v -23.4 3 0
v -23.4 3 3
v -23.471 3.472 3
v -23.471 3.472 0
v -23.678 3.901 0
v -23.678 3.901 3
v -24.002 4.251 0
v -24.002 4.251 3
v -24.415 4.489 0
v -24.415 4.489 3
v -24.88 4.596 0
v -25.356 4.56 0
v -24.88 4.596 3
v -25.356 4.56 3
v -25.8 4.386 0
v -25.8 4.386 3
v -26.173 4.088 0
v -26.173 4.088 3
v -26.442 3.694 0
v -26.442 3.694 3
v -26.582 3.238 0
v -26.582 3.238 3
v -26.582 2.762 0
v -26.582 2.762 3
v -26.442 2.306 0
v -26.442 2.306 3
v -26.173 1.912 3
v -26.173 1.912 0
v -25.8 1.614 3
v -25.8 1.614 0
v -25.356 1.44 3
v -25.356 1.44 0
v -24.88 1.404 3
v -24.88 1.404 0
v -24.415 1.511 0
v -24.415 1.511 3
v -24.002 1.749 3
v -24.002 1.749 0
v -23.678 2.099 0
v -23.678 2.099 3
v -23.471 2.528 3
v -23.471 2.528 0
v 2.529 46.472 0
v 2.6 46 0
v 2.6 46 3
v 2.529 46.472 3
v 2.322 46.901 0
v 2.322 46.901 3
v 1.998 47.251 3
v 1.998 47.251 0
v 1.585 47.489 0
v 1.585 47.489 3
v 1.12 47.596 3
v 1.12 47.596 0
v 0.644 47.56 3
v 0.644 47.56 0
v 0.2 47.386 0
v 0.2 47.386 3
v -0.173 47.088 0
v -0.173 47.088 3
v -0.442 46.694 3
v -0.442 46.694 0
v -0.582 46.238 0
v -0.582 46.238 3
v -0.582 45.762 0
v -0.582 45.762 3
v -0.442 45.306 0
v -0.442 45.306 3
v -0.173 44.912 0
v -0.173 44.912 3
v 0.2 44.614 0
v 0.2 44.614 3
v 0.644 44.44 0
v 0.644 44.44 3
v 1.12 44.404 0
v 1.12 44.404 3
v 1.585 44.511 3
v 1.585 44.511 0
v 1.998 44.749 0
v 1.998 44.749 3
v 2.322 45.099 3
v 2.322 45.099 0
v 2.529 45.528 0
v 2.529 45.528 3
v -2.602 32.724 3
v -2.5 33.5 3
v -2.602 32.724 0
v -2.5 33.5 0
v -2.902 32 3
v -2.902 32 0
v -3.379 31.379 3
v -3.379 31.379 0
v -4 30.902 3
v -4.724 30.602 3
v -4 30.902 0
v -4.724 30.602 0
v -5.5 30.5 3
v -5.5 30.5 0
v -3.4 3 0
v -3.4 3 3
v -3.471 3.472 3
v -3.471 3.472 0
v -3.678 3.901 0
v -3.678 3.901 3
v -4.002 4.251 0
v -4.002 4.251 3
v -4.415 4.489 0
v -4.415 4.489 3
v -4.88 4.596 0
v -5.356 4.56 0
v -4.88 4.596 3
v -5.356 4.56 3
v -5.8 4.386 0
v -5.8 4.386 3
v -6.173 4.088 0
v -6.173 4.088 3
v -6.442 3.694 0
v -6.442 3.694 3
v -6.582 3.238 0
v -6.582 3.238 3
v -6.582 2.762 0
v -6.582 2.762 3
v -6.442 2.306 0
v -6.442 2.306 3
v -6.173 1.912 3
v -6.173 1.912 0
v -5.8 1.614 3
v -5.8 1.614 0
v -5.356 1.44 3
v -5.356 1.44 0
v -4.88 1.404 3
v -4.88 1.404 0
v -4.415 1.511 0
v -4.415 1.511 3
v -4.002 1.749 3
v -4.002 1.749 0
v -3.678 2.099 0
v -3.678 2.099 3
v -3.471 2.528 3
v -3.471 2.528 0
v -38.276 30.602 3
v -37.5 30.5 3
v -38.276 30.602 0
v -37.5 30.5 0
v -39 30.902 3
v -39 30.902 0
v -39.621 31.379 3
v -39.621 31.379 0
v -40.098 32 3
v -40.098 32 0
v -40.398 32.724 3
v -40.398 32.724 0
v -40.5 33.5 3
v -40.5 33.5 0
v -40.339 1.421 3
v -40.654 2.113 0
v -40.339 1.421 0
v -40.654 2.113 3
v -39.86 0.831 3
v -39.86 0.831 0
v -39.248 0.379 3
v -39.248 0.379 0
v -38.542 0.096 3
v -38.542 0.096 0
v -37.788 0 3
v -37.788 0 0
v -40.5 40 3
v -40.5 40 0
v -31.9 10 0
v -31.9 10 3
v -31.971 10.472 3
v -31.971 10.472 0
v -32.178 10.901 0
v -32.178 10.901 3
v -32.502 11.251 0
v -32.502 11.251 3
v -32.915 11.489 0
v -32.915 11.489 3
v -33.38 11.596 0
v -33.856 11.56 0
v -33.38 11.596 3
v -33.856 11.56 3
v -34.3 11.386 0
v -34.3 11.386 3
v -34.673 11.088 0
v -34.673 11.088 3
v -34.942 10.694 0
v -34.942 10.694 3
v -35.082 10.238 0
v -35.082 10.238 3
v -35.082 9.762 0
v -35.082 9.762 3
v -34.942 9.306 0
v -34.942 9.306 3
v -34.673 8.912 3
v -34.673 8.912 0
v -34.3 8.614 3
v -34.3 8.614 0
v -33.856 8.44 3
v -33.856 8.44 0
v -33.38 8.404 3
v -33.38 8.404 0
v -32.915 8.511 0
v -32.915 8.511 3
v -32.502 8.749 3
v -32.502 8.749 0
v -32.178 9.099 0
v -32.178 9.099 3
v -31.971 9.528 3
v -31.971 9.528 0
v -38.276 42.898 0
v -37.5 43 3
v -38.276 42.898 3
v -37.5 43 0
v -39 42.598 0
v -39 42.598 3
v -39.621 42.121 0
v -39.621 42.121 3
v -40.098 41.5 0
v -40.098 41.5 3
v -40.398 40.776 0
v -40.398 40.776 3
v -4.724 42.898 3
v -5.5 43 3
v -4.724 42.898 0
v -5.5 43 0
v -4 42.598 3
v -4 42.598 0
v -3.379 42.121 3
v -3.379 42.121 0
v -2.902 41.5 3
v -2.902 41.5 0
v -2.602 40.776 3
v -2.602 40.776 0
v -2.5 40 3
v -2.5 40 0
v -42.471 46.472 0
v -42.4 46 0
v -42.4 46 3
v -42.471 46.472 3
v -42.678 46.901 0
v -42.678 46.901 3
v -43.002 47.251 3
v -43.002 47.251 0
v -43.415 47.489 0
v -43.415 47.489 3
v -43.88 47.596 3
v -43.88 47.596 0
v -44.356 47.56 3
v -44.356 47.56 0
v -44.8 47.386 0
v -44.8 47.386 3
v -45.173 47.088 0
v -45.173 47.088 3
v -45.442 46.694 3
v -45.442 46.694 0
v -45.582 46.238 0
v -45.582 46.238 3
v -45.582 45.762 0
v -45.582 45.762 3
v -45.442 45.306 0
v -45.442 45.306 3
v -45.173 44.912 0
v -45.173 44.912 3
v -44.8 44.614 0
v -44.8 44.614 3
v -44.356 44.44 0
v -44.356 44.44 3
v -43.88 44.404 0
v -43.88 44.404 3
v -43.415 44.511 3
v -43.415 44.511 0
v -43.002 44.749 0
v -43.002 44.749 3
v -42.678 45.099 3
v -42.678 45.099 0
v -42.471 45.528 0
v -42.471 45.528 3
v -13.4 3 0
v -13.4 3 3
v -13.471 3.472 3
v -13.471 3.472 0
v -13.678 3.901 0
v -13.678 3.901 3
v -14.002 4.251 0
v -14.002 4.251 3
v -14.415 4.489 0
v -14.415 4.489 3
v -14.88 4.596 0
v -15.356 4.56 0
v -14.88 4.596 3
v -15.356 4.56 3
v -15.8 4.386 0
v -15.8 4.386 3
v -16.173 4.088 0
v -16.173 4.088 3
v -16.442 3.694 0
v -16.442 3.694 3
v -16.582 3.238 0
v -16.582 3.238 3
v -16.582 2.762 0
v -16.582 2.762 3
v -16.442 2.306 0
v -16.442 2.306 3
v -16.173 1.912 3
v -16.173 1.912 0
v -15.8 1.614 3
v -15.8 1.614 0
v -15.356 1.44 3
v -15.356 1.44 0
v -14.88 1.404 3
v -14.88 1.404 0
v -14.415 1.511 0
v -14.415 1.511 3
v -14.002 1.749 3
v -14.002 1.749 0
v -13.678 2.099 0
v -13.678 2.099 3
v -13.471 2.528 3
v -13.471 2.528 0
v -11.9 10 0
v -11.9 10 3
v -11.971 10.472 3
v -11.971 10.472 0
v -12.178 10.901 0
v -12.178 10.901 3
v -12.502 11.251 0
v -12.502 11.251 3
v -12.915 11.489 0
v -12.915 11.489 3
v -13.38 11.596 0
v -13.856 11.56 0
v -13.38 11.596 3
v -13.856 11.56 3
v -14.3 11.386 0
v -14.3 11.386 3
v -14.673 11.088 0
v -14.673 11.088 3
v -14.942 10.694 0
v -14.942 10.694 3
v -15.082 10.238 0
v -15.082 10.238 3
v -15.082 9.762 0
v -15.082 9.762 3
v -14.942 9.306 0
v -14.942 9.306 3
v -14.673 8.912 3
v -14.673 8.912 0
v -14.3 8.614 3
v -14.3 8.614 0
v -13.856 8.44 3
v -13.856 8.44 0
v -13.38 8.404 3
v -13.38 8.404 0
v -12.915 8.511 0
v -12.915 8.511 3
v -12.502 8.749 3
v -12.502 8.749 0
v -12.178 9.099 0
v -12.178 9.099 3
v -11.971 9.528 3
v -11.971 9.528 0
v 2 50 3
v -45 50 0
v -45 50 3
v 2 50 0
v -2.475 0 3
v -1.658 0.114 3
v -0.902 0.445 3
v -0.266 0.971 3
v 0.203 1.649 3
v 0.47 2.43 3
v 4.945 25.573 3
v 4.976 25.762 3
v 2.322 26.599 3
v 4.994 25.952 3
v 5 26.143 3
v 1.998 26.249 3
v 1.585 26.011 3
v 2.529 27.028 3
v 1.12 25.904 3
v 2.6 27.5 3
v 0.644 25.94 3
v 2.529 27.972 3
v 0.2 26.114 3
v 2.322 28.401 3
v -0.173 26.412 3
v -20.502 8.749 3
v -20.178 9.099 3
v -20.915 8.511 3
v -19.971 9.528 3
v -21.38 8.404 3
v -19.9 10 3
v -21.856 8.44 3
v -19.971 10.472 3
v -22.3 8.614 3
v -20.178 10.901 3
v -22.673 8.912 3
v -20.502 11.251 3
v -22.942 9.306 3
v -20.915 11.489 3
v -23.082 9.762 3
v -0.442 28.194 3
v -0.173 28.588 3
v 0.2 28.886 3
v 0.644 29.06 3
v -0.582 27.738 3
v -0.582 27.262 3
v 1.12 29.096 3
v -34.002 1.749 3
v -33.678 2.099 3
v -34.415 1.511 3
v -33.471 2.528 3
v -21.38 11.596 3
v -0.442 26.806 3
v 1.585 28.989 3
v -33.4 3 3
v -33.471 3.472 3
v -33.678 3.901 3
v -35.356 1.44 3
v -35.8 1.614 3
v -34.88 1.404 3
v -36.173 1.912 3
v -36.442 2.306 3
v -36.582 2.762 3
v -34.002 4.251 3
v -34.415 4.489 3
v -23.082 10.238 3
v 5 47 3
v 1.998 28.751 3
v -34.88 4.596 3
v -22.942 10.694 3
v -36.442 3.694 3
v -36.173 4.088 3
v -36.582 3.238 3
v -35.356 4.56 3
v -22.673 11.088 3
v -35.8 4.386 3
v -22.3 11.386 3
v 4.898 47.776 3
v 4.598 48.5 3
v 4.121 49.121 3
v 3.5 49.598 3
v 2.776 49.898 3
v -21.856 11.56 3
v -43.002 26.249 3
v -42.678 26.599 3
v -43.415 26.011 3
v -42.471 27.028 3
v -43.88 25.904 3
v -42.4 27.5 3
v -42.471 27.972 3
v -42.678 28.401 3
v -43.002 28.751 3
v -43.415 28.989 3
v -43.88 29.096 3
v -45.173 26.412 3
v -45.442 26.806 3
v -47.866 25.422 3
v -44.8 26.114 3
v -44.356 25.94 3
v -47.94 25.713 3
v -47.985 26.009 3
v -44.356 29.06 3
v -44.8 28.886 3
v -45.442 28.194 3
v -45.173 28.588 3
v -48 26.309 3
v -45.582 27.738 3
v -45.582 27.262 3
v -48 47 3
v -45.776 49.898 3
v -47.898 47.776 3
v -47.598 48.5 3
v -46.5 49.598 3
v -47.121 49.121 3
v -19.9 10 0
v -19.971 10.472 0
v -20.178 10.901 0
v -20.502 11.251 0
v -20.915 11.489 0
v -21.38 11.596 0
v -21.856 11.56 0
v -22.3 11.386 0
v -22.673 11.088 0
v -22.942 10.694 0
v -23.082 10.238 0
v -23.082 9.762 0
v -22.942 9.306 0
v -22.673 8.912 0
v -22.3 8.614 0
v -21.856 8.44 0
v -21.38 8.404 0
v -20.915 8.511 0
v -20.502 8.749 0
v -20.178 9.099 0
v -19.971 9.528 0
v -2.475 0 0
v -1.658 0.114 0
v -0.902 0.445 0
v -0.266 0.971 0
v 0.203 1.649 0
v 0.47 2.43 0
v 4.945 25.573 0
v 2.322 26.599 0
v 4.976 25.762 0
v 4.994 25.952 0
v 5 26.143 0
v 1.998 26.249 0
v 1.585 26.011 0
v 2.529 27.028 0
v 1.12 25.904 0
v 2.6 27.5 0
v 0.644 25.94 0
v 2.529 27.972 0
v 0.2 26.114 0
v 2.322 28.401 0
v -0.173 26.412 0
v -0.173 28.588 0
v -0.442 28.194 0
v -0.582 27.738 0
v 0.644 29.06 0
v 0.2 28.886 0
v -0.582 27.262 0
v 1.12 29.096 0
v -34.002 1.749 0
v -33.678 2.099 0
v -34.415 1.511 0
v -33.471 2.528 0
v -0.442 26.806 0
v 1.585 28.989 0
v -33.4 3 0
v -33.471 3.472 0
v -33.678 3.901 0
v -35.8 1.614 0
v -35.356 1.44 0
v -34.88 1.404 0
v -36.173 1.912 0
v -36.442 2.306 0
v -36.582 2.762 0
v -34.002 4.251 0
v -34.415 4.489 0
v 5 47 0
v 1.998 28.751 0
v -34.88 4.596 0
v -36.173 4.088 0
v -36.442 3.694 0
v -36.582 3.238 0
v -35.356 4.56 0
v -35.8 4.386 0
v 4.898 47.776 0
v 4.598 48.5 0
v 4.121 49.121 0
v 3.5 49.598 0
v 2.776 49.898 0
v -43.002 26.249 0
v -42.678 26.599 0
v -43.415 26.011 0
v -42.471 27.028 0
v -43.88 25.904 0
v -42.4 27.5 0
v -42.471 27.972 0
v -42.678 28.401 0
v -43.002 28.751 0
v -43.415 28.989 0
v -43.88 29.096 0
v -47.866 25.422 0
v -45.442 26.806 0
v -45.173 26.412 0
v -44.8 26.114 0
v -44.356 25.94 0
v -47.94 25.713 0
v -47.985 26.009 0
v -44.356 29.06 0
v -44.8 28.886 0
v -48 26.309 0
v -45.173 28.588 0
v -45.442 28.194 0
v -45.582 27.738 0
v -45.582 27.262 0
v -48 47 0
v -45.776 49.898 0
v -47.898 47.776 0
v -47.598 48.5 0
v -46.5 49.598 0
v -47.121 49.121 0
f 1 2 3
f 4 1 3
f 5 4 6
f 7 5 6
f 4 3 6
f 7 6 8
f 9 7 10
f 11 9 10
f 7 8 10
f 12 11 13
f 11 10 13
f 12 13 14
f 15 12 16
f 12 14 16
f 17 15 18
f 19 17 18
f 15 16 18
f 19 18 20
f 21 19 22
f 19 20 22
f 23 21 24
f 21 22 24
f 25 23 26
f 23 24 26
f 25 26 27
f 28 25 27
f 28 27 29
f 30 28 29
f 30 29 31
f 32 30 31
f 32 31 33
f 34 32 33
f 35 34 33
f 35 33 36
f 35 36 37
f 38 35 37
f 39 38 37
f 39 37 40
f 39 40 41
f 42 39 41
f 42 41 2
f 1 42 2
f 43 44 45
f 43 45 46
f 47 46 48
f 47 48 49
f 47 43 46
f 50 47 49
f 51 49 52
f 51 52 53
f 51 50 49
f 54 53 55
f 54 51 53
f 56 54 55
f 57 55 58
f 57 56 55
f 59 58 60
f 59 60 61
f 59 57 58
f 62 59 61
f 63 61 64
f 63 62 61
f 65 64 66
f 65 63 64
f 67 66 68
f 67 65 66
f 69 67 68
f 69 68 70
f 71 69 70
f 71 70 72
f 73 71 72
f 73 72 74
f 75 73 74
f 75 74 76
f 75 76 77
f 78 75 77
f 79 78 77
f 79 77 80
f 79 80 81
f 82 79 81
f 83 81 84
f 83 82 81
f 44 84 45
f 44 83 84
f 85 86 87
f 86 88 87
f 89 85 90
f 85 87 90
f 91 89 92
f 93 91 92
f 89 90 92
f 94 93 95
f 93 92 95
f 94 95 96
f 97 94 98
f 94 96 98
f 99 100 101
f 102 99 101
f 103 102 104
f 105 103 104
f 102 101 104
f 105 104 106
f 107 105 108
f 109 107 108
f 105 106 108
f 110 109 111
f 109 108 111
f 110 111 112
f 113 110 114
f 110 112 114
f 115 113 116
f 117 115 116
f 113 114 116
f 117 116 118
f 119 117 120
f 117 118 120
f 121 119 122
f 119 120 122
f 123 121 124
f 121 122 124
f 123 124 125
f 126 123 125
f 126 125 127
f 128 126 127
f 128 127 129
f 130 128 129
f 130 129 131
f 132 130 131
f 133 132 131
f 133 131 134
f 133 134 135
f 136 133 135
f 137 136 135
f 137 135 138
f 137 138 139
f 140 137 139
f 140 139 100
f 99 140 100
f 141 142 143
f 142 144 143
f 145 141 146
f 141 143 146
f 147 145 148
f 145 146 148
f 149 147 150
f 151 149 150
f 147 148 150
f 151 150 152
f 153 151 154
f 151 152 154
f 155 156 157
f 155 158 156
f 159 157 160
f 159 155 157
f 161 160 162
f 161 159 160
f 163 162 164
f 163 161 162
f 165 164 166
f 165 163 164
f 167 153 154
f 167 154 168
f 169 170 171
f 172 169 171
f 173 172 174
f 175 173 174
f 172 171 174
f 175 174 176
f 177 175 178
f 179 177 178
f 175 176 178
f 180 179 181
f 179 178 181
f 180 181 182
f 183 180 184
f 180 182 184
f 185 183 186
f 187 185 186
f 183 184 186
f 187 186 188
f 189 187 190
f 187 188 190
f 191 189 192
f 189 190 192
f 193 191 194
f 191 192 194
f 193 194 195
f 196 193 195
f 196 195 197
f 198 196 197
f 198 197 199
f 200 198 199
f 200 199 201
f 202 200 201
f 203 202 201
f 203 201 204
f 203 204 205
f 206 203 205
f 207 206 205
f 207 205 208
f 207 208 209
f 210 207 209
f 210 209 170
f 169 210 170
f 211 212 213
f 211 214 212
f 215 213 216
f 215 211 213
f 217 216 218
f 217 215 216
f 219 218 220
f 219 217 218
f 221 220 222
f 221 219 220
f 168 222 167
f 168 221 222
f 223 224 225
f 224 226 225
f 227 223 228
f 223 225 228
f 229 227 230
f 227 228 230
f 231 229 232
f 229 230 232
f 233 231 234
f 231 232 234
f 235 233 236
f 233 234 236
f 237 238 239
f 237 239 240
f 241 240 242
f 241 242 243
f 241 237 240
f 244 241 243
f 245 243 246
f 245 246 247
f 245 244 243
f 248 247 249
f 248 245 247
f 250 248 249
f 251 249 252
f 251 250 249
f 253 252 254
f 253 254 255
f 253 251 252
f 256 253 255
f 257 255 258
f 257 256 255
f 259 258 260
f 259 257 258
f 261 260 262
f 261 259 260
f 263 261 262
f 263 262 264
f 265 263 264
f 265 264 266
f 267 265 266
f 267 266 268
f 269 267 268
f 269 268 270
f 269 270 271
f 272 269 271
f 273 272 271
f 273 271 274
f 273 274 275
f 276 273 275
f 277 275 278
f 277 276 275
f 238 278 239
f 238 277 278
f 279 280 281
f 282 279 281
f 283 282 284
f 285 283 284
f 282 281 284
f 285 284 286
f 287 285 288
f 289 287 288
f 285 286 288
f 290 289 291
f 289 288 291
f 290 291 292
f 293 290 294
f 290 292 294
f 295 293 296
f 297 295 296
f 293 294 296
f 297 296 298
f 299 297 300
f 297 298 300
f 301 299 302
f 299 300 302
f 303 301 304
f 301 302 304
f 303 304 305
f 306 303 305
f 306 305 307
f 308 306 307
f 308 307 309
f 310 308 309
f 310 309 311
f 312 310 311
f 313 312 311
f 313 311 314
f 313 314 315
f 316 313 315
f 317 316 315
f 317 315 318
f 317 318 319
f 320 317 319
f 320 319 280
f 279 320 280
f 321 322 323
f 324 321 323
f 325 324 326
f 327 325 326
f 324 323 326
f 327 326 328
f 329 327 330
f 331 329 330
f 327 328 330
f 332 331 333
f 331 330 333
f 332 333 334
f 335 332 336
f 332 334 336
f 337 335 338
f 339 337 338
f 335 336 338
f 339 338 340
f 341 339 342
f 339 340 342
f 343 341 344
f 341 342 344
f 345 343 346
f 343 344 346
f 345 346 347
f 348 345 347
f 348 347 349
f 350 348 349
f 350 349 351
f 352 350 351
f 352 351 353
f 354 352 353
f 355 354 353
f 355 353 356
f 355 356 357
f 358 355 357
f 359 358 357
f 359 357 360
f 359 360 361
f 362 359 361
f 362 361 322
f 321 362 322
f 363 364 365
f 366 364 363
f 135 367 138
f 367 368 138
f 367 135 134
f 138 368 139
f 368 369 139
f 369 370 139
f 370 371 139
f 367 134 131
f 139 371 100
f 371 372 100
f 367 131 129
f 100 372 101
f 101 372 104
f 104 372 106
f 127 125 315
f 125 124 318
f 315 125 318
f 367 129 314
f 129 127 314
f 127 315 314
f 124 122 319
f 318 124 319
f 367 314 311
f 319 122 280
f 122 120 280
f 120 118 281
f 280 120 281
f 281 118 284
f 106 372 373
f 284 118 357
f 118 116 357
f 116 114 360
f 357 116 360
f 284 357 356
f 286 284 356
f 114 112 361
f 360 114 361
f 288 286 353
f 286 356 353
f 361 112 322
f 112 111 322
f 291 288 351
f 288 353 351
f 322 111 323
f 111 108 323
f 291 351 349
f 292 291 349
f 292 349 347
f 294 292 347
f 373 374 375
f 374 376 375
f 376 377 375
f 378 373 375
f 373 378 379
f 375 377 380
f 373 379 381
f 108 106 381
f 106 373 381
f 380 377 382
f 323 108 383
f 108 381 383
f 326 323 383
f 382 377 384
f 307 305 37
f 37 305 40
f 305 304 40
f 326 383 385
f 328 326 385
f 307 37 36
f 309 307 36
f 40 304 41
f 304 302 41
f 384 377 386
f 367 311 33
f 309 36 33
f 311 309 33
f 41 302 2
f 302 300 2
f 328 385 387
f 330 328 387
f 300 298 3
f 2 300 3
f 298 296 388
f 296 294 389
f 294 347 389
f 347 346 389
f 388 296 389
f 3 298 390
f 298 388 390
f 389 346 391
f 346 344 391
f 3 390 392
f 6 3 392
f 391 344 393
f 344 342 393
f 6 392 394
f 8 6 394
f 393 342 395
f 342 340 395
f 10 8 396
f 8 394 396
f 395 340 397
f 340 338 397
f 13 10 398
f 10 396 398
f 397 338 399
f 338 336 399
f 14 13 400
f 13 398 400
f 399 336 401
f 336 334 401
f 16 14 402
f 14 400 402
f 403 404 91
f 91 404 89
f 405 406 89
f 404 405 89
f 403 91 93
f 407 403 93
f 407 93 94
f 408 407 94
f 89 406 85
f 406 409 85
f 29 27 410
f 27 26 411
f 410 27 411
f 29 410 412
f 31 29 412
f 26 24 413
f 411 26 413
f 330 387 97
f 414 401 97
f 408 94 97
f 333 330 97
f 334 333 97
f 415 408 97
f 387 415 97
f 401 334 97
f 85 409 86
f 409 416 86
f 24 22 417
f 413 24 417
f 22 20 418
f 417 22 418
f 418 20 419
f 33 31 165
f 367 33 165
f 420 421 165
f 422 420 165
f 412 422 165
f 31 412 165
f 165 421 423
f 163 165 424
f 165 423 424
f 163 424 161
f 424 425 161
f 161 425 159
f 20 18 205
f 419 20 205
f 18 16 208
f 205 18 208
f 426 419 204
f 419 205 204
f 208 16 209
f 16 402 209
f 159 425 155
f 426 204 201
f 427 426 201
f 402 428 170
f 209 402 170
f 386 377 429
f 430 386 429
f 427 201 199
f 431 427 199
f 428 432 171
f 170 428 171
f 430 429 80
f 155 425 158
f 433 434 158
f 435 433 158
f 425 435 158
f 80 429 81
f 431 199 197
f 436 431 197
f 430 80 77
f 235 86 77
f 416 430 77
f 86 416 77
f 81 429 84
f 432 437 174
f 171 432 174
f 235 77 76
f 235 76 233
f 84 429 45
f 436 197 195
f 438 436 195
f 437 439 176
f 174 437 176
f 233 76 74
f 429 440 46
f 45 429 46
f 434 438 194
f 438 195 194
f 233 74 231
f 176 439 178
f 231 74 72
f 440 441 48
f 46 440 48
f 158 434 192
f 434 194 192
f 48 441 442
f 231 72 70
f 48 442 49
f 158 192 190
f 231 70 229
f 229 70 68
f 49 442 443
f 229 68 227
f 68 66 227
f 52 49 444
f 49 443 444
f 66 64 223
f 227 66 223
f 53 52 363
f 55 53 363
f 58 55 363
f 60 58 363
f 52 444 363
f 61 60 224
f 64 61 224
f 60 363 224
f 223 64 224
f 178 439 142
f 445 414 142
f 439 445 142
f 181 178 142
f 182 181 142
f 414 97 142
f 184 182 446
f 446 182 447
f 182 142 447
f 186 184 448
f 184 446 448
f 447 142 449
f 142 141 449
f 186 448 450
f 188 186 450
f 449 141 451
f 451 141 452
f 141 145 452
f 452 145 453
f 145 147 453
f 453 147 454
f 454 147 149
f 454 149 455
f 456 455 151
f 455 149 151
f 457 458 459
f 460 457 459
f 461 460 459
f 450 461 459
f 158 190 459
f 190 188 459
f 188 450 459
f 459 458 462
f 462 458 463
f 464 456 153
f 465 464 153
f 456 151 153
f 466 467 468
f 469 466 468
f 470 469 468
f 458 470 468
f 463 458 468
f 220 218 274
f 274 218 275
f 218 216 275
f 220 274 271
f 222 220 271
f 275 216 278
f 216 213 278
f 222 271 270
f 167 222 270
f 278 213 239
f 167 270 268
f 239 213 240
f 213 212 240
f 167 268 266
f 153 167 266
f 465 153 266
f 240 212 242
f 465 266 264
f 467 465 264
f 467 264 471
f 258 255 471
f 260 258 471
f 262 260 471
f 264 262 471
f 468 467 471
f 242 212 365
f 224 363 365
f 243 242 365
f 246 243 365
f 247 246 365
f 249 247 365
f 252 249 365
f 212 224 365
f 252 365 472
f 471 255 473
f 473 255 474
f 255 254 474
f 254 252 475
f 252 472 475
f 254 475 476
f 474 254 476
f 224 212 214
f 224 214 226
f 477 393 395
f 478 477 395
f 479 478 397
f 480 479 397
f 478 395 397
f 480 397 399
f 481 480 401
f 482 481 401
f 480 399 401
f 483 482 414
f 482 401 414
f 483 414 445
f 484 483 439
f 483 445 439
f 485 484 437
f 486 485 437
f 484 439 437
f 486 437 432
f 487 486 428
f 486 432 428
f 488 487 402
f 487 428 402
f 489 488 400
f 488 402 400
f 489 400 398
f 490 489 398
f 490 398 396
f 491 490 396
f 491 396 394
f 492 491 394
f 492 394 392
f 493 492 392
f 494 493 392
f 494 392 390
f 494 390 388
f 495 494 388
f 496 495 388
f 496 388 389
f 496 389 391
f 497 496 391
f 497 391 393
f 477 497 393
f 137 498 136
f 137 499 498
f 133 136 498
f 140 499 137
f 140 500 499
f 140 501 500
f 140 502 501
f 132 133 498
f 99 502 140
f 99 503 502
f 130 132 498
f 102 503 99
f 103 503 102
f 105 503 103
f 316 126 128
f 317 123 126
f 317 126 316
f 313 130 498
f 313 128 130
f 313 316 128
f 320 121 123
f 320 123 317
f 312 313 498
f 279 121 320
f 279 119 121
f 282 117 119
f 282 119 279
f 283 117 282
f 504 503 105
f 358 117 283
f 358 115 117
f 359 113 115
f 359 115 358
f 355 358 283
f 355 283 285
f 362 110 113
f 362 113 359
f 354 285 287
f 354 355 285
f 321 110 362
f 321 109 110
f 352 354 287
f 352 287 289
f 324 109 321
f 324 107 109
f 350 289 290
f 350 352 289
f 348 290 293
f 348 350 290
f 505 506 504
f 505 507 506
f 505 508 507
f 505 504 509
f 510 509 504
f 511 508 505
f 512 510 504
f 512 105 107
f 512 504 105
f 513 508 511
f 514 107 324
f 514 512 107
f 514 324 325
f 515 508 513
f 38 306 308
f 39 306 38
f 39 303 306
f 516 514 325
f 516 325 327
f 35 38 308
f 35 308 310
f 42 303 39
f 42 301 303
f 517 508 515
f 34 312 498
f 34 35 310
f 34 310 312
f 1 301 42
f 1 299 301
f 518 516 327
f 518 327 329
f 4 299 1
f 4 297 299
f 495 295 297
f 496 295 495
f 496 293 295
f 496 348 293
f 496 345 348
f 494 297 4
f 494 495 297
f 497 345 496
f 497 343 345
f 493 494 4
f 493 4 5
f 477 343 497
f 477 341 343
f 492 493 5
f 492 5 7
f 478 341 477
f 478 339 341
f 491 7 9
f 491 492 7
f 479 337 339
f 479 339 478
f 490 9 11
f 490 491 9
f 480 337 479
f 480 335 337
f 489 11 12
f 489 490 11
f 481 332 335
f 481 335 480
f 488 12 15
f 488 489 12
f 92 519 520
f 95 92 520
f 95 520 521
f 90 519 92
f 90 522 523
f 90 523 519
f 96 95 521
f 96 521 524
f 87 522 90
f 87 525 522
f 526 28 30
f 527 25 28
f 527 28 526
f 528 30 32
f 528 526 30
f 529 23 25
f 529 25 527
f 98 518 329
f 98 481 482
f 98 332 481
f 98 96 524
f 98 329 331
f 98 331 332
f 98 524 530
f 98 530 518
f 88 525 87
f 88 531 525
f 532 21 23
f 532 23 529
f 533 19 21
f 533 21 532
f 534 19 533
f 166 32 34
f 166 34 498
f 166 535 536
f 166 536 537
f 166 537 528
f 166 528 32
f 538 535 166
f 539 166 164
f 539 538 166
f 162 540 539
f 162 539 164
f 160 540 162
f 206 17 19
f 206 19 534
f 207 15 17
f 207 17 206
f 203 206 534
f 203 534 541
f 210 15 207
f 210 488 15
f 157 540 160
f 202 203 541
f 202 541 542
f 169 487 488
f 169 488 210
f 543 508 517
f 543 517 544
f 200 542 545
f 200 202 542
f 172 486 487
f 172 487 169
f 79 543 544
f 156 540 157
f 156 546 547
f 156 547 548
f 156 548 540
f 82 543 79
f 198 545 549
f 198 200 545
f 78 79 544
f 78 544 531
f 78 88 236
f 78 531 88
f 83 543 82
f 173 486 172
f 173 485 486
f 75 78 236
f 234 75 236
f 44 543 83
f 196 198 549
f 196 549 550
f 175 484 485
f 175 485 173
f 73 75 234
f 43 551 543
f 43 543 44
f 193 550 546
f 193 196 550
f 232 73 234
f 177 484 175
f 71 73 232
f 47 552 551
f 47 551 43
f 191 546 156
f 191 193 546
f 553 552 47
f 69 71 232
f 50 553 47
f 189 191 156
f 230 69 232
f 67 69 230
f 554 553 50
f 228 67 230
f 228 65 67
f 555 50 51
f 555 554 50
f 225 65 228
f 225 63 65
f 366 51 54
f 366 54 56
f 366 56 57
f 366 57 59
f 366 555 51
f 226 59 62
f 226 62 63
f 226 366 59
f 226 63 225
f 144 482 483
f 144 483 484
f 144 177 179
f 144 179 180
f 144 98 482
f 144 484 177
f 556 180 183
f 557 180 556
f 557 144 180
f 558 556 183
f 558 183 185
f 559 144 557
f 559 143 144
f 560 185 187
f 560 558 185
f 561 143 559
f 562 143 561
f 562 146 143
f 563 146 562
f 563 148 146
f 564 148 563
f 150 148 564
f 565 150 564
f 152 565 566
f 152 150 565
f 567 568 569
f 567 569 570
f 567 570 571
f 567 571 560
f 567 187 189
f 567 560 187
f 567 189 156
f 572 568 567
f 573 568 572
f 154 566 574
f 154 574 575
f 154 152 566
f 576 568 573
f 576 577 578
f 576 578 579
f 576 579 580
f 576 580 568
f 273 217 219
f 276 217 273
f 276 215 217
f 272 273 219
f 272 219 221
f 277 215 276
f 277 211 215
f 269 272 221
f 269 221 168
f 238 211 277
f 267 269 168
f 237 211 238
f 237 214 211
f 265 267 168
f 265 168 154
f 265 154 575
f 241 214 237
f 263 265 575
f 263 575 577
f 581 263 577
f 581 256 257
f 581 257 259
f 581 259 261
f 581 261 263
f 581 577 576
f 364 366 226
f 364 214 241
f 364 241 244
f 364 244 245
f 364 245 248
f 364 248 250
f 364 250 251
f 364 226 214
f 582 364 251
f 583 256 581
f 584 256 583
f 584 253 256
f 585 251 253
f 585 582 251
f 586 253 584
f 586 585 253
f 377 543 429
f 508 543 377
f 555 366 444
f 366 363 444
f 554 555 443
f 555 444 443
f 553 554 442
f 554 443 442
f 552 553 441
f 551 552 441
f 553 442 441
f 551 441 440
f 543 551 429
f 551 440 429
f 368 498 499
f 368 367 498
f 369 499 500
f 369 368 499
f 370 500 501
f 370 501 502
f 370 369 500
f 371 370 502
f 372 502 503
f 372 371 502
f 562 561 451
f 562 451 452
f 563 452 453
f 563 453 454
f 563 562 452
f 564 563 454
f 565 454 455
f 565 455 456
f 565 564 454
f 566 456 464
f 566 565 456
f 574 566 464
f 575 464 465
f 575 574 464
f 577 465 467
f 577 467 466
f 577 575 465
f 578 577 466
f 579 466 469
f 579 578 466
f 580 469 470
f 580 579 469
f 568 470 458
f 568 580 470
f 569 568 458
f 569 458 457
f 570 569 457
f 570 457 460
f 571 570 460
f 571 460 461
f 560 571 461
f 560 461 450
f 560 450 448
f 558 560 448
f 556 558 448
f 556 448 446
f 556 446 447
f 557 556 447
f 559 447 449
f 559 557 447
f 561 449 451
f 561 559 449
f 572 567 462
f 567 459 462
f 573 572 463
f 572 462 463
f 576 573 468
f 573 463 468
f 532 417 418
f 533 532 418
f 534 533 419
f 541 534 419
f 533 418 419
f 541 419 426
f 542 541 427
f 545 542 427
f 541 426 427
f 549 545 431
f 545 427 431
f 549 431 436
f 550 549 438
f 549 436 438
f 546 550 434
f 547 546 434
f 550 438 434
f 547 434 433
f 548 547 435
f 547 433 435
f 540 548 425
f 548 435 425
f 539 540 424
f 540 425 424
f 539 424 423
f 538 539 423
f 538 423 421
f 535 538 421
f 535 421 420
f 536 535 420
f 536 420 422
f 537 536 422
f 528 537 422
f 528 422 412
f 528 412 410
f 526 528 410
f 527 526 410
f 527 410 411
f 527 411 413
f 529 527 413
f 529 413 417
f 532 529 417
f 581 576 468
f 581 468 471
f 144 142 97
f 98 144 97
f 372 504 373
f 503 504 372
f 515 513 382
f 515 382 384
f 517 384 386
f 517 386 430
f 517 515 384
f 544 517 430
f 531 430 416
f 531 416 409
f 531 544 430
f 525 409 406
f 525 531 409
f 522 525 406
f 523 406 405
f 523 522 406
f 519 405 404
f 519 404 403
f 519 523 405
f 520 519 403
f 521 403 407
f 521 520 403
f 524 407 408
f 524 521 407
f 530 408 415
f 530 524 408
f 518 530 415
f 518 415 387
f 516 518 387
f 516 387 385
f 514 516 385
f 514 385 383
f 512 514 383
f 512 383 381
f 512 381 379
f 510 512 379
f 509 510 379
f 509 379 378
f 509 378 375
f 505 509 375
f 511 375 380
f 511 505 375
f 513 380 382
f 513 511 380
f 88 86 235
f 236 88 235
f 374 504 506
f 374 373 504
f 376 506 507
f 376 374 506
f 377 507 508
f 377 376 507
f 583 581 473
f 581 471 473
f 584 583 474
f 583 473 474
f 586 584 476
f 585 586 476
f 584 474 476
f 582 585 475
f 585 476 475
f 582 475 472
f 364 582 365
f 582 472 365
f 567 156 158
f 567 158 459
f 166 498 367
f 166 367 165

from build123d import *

# Parameters (mm, degrees)
SKETCH_1_R          = 1.6
EXTRUDE_1_DEPTH     = 3
SKETCH_2_R          = 1.6
CUT_EXTRUDE_1_DEPTH = 4
SKETCH_3_R          = 1.6
CUT_EXTRUDE_2_DEPTH = 4
SKETCH_4_W          = 38
SKETCH_4_H          = 12.5
CUT_EXTRUDE_3_DEPTH = 4
FILLET_1_R          = 3


with BuildPart() as part:
    # 草图1 → 凸台-拉伸1 (new body)
    with BuildSketch(Plane.XY):
        Polygon((-40, 0), (-48, 25.855555556), (-48, 50), (5, 50), (5, 25.855555556), (0, 0), align=None)
        with Locations((-44, 46)):
            Circle(SKETCH_1_R, mode=Mode.SUBTRACT)
        with Locations((1, 46)):
            Circle(SKETCH_1_R, mode=Mode.SUBTRACT)
        with Locations((1, 27.5)):
            Circle(SKETCH_1_R, mode=Mode.SUBTRACT)
        with Locations((-44, 27.5)):
            Circle(SKETCH_1_R, mode=Mode.SUBTRACT)
    extrude(amount=EXTRUDE_1_DEPTH)

    # 草图2 → 切除-拉伸1 (cut, through all)
    with BuildSketch(Plane.XY.offset(3)):
        with Locations((-5, 3)):
            Circle(SKETCH_2_R)
        with Locations((-15, 3)):
            Circle(SKETCH_2_R)
        with Locations((-25, 3)):
            Circle(SKETCH_2_R)
        with Locations((-35, 3)):
            Circle(SKETCH_2_R)
    extrude(amount=-CUT_EXTRUDE_1_DEPTH, mode=Mode.SUBTRACT)

    # 草图3 → 切除-拉伸2 (cut, through all)
    with BuildSketch(Plane.XY.offset(3)):
        with Locations((-13.5, 10)):
            Circle(SKETCH_3_R)
        with Locations((-21.5, 10)):
            Circle(SKETCH_3_R)
        with Locations((-33.5, 10)):
            Circle(SKETCH_3_R)
        with Locations((-21.5, 34)):
            Circle(SKETCH_3_R)
    extrude(amount=-CUT_EXTRUDE_2_DEPTH, mode=Mode.SUBTRACT)

    # 草图4 → 切除-拉伸3 (cut, through all)
    with BuildSketch(Plane.XY.offset(3)):
        with Locations((-21.5, 36.75)):
            Rectangle(SKETCH_4_W, SKETCH_4_H)
    extrude(amount=-CUT_EXTRUDE_3_DEPTH, mode=Mode.SUBTRACT)

    # 圆角1
    fillet_1_edges = [part.edges().sort_by_distance(p)[0] for p in [
        (0, 0, 1.5),
        (-40, 0, 1.5),
        (-48, 25.855555556, 1.5),
        (-48, 50, 1.5),
        (5, 50, 1.5),
        (5, 25.855555556, 1.5),
        (-2.5, 43, 1.5),
        (-2.5, 30.5, 1.5),
        (-40.5, 30.5, 1.5),
        (-40.5, 43, 1.5),
    ]]
    fillet(fillet_1_edges, radius=FILLET_1_R)


solid = part.part
